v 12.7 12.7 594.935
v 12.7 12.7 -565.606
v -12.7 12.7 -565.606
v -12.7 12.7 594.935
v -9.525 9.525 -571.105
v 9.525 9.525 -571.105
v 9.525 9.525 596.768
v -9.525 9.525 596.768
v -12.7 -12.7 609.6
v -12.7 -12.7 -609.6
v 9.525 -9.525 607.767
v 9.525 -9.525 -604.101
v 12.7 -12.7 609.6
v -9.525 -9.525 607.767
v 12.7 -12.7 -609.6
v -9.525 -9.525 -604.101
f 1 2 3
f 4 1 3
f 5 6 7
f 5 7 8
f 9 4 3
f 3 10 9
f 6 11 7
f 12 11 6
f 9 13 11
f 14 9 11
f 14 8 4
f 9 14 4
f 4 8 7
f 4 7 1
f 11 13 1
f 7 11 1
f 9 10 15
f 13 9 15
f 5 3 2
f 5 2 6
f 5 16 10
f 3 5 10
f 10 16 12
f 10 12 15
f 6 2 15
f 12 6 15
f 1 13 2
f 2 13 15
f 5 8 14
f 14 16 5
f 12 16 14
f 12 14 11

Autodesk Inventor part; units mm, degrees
ref_plane "YZ Plane" through (0, 0, 0) normal (1, 0, 0) x (0, 1, 0)
ref_plane "XZ Plane" through (0, 0, 0) normal (0, 1, 0) x (-1, 0, 0)
ref_plane "XY Plane" through (0, 0, 0) normal (0, 0, 1) x (1, 0, 0)
sketch "Sketch1" plane through (0, 0, 0) normal (0, 0, 1) x (1, 0, 0)
  line L0 (-12.7, -12.7) -> (12.7, -12.7)
  line L1 (12.7, -12.7) -> (12.7, 12.7)
  line L2 (12.7, 12.7) -> (-12.7, 12.7)
  line L3 (-12.7, 12.7) -> (-12.7, -12.7)
  line L4 (-12.7, -12.7) -> (12.7, 12.7) construction
  line L5 (12.7, -12.7) -> (-12.7, 12.7) construction
  line L6 (-9.525, -9.525) -> (9.525, -9.525)
  line L7 (9.525, -9.525) -> (9.525, 9.525)
  line L8 (9.525, 9.525) -> (-9.525, 9.525)
  line L9 (-9.525, 9.525) -> (-9.525, -9.525)
  line L10 (-9.525, -9.525) -> (9.525, 9.525) construction
  line L11 (9.525, -9.525) -> (-9.525, 9.525) construction
  point P0 (0, 0)
  dimension "d0" = 25.4
  dimension "d1" = 3.175
extrude "Extrusion1" add sketch "Sketch1" along normal mid plane 1219.2
sketch "Sketch3" plane through (12.7, -12.7, 609.6) normal (1, 0, 0) x (0, 0, -1)
  line L0 (1219.2, 25.4) -> (0, 25.4) projected
  line L1 (0, 0) -> (1219.2, 0) projected
  line L2 (0, 25.4) -> (0, 0)
  line L3 (0, 0) -> (14.6647, 25.4)
  line L4 (1219.2, 0) -> (1219.2, 25.4)
  line L5 (1219.2, 22.225) -> (1219.2, 3.175) projected
  line L6 (1175.2059, 25.4) -> (1219.2, 0)
  point P0 (609.6, 12.7)
  dimension "d6" = 30
  dimension "d7" = 60
extrude "Extrusion3" cut sketch "Sketch3" against normal through all contours L4 L6 L0 | L3 L2 L0
properties part number "30-60-supportBrace"
